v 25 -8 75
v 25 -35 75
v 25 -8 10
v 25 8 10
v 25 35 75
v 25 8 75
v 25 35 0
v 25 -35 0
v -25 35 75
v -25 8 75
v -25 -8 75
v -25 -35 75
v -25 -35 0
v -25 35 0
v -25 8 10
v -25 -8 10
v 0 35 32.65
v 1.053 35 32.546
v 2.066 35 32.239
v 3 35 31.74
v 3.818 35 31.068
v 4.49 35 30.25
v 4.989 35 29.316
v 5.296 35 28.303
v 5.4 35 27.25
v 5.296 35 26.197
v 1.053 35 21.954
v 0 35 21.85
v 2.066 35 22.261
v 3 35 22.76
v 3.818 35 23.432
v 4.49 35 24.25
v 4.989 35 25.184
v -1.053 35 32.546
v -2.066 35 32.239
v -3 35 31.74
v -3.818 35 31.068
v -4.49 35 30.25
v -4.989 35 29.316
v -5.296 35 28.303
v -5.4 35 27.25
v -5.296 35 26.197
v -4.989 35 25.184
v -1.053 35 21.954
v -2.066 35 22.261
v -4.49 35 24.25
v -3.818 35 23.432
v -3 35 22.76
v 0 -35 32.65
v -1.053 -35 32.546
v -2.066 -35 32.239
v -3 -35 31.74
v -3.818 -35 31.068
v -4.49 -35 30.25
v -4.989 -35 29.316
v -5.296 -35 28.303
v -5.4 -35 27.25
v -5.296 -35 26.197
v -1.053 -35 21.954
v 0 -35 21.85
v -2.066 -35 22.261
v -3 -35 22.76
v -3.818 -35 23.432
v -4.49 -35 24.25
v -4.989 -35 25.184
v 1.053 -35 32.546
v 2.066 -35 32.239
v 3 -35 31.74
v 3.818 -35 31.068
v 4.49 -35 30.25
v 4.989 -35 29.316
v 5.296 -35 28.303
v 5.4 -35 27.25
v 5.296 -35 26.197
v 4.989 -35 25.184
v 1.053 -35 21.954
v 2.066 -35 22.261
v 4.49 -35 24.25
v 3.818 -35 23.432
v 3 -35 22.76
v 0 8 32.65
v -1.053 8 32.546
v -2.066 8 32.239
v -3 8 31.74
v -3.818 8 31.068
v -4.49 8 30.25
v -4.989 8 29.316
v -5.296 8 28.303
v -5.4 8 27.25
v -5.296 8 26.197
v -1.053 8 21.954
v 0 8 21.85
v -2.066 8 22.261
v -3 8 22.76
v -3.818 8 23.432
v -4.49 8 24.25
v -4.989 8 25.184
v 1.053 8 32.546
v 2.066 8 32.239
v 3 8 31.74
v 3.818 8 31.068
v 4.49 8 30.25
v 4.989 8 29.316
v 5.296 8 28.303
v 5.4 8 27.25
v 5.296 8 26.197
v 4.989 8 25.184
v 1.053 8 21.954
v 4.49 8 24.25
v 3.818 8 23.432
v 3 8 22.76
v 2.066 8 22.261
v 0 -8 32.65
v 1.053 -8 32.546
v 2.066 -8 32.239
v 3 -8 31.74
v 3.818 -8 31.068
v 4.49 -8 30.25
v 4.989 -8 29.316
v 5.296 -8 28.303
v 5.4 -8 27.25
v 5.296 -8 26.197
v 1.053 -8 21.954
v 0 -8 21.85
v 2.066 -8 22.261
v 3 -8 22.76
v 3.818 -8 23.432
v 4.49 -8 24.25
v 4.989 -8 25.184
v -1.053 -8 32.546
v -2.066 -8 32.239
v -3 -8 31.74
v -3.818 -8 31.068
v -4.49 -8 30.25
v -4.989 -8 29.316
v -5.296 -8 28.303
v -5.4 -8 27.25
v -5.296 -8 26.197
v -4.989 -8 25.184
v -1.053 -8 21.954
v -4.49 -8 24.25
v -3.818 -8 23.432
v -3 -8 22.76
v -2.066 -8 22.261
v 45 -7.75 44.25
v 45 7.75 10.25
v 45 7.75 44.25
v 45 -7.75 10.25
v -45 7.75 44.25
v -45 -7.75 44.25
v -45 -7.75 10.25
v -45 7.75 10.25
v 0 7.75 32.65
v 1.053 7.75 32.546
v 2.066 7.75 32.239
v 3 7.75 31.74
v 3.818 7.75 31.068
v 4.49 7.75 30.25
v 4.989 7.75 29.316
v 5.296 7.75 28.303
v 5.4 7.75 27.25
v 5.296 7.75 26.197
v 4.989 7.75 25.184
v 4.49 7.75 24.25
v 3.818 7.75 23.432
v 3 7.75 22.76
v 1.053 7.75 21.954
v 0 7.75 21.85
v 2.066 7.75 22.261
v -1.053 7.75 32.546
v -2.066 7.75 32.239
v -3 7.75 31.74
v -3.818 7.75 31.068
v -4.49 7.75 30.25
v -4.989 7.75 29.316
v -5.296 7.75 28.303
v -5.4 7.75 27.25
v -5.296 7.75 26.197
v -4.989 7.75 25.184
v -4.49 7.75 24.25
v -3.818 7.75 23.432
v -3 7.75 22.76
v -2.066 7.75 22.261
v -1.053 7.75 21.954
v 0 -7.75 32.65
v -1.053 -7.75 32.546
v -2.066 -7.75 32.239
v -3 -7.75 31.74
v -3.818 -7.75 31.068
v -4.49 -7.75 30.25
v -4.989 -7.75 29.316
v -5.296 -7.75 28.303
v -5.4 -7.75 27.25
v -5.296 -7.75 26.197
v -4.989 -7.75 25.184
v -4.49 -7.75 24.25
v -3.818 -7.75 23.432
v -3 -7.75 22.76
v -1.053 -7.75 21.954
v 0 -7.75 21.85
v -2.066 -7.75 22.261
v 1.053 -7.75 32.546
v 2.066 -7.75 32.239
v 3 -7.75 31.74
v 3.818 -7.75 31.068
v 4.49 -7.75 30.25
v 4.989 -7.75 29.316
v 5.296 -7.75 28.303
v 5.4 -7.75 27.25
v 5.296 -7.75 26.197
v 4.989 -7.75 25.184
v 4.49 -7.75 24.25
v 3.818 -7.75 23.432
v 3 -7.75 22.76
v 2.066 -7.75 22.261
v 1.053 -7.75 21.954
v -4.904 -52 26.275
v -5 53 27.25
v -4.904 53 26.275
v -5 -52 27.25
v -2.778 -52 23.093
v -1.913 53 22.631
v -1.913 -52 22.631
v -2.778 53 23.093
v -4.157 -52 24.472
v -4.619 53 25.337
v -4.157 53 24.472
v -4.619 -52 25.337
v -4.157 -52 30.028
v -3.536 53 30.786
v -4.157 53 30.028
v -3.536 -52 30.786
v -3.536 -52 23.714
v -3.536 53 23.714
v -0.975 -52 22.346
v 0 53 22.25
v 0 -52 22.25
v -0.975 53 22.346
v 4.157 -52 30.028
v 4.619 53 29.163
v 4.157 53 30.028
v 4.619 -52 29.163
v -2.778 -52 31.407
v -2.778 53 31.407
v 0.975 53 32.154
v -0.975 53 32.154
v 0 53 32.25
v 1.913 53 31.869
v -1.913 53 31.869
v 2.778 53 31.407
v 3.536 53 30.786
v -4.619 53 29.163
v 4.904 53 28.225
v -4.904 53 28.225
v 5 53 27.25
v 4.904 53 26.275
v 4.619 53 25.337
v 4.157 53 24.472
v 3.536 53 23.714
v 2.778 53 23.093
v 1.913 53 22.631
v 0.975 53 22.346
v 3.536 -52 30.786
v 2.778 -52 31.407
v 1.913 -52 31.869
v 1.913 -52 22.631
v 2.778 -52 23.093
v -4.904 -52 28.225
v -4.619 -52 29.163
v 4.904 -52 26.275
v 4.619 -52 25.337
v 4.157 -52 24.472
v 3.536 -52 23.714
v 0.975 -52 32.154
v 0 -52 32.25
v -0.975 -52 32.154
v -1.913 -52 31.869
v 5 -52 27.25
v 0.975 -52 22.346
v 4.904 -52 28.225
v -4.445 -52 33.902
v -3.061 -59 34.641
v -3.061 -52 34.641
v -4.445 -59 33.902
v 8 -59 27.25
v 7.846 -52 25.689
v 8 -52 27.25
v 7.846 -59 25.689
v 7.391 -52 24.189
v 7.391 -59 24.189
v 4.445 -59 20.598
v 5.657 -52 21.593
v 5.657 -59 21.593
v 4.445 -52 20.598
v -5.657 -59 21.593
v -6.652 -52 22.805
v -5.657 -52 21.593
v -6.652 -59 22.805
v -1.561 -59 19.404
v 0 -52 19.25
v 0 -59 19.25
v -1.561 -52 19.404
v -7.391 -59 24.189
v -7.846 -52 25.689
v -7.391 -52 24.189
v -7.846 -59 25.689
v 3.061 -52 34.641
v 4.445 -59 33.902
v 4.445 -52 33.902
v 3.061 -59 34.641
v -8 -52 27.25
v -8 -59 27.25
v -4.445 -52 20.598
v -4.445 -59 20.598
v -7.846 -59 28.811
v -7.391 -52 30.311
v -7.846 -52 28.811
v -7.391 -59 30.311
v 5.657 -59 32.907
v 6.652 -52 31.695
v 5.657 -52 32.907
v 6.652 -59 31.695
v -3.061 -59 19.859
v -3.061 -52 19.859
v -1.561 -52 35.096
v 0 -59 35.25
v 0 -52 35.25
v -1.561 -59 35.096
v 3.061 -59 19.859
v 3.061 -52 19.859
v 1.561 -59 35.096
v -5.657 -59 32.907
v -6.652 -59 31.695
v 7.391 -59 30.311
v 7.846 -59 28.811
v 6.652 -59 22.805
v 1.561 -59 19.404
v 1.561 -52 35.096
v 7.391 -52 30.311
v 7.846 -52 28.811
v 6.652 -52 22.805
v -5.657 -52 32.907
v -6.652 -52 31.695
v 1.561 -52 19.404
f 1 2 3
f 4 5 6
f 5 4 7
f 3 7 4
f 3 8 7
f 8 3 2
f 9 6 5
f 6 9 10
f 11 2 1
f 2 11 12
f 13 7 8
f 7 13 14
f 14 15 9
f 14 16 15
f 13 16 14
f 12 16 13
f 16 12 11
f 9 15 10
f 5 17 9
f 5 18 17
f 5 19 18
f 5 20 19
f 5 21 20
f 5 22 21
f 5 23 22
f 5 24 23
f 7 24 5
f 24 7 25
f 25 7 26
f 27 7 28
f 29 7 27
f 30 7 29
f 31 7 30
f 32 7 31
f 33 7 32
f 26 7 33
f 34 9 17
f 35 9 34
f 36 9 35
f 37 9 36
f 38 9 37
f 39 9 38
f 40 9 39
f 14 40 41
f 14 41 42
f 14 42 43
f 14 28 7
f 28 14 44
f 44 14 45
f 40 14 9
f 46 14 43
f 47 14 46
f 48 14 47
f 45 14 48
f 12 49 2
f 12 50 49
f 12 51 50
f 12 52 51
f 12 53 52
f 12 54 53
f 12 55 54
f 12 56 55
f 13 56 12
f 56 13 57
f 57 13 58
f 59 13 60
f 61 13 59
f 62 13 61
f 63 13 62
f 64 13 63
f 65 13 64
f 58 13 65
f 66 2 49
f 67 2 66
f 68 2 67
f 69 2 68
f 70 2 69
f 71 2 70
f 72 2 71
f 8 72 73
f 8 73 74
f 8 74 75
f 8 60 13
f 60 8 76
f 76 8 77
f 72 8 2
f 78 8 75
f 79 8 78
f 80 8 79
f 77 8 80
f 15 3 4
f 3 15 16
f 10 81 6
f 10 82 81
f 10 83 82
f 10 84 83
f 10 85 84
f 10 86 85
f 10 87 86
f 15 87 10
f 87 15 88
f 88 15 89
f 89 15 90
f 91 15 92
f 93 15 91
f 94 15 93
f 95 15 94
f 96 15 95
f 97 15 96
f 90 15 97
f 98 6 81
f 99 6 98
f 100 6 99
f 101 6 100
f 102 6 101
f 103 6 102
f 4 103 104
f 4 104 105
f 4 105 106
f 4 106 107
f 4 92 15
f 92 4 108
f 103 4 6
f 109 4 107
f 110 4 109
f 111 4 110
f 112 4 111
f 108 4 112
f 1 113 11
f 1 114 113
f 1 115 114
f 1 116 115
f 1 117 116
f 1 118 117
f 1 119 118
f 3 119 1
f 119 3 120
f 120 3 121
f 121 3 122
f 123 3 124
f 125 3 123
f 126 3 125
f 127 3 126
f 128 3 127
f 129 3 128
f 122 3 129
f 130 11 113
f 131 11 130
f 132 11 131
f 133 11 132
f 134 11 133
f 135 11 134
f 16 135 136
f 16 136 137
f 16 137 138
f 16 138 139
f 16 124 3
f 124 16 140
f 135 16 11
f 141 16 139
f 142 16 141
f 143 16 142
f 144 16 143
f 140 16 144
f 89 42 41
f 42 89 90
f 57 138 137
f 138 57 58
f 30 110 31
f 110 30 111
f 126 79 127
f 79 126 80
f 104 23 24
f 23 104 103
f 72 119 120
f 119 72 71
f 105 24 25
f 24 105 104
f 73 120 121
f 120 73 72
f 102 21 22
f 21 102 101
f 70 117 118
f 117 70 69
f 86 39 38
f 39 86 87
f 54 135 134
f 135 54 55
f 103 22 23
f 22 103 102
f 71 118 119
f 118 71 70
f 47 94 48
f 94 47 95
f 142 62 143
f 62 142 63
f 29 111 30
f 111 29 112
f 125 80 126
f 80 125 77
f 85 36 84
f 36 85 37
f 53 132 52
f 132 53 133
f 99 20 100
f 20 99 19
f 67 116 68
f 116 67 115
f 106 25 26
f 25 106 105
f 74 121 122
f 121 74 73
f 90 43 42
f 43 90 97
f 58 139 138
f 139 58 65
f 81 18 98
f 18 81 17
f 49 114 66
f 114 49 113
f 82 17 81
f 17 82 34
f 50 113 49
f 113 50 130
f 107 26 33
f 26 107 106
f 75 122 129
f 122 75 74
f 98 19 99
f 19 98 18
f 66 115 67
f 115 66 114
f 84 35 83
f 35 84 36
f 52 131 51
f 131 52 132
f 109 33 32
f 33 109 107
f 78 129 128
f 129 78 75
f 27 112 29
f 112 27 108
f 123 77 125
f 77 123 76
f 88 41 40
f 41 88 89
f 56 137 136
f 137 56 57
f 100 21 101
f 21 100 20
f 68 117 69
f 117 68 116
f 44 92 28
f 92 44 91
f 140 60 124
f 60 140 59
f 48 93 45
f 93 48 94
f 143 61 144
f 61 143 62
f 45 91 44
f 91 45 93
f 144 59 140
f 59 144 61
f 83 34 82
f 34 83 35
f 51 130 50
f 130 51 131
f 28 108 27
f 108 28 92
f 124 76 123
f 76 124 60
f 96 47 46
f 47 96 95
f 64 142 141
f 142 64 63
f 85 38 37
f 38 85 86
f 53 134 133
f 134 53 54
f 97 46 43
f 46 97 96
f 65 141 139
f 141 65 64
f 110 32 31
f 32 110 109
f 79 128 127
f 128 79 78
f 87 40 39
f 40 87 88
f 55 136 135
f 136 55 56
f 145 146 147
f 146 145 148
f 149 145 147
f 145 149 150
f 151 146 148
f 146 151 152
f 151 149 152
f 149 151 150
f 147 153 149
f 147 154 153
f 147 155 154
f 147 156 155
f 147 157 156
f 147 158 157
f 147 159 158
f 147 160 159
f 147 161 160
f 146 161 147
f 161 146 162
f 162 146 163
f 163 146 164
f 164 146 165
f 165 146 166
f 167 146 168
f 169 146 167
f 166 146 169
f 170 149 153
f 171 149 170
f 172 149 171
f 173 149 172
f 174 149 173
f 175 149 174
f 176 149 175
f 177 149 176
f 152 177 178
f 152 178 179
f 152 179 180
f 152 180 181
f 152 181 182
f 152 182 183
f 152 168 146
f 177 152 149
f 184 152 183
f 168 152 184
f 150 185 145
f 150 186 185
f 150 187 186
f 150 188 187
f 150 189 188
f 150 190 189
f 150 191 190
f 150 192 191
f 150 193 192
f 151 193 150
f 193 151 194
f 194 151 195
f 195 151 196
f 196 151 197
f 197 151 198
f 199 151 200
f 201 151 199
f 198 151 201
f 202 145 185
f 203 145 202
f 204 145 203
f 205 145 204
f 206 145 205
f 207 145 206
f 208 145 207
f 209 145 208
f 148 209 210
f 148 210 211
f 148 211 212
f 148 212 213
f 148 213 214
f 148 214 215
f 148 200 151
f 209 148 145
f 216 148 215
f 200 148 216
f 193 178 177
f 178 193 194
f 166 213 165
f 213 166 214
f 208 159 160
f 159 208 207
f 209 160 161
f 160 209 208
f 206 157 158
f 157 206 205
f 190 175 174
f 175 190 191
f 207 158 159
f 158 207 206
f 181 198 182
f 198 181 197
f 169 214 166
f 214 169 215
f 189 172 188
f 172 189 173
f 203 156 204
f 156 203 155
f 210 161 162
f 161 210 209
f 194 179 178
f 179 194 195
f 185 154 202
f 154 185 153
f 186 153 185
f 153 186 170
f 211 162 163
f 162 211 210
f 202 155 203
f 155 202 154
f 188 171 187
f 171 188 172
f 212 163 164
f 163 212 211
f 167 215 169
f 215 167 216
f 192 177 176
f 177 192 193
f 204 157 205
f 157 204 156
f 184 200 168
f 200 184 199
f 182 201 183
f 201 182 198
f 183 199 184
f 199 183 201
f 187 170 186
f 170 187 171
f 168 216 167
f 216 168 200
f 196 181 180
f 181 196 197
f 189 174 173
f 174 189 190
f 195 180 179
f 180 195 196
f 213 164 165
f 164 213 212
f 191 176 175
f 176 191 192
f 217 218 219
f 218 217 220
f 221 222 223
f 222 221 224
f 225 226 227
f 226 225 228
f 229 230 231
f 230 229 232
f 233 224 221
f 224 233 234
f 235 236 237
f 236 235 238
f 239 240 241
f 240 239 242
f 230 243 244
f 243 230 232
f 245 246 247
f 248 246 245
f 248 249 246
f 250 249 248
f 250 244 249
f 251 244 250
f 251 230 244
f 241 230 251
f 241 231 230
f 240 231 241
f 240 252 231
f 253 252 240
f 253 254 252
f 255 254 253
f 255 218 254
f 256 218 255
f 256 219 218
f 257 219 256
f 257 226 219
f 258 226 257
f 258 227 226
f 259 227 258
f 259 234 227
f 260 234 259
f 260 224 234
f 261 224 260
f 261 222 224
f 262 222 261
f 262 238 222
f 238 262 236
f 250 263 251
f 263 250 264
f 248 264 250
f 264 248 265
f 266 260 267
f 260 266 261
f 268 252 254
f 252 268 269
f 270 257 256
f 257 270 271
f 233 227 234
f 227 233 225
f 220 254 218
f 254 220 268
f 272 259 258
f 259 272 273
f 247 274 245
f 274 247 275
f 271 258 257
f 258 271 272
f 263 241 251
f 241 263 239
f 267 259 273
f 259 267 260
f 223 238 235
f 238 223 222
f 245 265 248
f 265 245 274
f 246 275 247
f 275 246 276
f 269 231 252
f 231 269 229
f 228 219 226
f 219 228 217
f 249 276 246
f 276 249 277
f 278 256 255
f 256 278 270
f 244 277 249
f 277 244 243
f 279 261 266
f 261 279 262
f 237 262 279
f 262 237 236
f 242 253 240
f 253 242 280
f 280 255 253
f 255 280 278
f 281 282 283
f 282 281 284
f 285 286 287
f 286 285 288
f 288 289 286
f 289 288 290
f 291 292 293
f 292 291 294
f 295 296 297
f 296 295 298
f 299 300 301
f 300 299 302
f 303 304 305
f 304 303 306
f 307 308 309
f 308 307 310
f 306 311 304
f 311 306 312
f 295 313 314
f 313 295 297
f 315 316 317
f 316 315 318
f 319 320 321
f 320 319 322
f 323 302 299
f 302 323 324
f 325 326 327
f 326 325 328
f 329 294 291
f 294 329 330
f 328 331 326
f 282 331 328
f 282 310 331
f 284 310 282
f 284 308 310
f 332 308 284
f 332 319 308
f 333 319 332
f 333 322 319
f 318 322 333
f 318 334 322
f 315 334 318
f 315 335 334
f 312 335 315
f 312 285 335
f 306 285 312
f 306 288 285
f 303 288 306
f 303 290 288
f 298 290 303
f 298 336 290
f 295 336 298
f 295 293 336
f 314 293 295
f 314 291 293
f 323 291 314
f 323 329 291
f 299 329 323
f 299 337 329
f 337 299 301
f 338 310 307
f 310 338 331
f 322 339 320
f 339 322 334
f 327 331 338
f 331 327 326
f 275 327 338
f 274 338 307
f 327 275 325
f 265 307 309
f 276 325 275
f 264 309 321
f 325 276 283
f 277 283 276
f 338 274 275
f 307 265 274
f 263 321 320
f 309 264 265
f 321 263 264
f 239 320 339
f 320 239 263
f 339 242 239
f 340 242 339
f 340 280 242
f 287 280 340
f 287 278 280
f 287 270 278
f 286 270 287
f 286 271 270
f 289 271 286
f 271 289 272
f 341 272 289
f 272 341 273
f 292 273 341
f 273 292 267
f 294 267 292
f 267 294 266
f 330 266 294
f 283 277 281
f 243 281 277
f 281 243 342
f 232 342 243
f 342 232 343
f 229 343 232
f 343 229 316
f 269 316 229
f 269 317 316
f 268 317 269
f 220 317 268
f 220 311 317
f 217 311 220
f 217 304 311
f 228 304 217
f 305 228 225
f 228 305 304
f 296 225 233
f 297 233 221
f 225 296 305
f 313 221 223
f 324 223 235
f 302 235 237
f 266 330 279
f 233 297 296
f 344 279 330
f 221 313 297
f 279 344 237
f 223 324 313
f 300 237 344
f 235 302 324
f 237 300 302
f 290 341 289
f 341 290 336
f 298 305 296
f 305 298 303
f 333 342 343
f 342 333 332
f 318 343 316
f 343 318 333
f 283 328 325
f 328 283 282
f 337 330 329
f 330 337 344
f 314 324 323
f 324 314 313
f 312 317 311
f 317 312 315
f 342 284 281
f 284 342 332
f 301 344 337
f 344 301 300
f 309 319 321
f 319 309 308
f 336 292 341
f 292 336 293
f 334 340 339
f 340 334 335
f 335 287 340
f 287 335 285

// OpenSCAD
$fn = 32;

// ------------------------------------------------------------------------
// Clevis joint: 50 mm clevis, pin d10
// Every part is its own module, assembly() places them once.
// ------------------------------------------------------------------------

// --- part 1 ---
module clevis() {
  difference() {
    translate([-25, -35, 0]) cube([50, 70, 75]);
    translate([-26, -8, 10]) cube([52, 16, 66]);
    translate([0, 0, 27.25]) rotate([90, 0, 0]) cylinder(h = 72, d = 10.8, center = true);
  }
}

// --- part 2 ---
module eye() {
  difference() {
    translate([-45, -7.75, 0]) cube([90, 15.5, 34]);
    translate([0, 0, 17]) rotate([90, 0, 0]) cylinder(h = 17.5, d = 10.8, center = true);
  }
}

// --- part 3 ---
module pin() {
  rotate([0, 90, 0]) cylinder(h = 106, d = 10, center = true);
  translate([-59, 0, 0]) rotate([0, 90, 0]) cylinder(h = 7, d = 16);
}

// --- assembly ---
module assembly() {
  translate([0, 0, 0]) rotate([0, 0, 0]) clevis();
  translate([0, 0, 10.25]) rotate([0, 0, 0]) eye();
  translate([0, 0, 27.25]) rotate([0, 0, 90]) pin();
}

assembly();
